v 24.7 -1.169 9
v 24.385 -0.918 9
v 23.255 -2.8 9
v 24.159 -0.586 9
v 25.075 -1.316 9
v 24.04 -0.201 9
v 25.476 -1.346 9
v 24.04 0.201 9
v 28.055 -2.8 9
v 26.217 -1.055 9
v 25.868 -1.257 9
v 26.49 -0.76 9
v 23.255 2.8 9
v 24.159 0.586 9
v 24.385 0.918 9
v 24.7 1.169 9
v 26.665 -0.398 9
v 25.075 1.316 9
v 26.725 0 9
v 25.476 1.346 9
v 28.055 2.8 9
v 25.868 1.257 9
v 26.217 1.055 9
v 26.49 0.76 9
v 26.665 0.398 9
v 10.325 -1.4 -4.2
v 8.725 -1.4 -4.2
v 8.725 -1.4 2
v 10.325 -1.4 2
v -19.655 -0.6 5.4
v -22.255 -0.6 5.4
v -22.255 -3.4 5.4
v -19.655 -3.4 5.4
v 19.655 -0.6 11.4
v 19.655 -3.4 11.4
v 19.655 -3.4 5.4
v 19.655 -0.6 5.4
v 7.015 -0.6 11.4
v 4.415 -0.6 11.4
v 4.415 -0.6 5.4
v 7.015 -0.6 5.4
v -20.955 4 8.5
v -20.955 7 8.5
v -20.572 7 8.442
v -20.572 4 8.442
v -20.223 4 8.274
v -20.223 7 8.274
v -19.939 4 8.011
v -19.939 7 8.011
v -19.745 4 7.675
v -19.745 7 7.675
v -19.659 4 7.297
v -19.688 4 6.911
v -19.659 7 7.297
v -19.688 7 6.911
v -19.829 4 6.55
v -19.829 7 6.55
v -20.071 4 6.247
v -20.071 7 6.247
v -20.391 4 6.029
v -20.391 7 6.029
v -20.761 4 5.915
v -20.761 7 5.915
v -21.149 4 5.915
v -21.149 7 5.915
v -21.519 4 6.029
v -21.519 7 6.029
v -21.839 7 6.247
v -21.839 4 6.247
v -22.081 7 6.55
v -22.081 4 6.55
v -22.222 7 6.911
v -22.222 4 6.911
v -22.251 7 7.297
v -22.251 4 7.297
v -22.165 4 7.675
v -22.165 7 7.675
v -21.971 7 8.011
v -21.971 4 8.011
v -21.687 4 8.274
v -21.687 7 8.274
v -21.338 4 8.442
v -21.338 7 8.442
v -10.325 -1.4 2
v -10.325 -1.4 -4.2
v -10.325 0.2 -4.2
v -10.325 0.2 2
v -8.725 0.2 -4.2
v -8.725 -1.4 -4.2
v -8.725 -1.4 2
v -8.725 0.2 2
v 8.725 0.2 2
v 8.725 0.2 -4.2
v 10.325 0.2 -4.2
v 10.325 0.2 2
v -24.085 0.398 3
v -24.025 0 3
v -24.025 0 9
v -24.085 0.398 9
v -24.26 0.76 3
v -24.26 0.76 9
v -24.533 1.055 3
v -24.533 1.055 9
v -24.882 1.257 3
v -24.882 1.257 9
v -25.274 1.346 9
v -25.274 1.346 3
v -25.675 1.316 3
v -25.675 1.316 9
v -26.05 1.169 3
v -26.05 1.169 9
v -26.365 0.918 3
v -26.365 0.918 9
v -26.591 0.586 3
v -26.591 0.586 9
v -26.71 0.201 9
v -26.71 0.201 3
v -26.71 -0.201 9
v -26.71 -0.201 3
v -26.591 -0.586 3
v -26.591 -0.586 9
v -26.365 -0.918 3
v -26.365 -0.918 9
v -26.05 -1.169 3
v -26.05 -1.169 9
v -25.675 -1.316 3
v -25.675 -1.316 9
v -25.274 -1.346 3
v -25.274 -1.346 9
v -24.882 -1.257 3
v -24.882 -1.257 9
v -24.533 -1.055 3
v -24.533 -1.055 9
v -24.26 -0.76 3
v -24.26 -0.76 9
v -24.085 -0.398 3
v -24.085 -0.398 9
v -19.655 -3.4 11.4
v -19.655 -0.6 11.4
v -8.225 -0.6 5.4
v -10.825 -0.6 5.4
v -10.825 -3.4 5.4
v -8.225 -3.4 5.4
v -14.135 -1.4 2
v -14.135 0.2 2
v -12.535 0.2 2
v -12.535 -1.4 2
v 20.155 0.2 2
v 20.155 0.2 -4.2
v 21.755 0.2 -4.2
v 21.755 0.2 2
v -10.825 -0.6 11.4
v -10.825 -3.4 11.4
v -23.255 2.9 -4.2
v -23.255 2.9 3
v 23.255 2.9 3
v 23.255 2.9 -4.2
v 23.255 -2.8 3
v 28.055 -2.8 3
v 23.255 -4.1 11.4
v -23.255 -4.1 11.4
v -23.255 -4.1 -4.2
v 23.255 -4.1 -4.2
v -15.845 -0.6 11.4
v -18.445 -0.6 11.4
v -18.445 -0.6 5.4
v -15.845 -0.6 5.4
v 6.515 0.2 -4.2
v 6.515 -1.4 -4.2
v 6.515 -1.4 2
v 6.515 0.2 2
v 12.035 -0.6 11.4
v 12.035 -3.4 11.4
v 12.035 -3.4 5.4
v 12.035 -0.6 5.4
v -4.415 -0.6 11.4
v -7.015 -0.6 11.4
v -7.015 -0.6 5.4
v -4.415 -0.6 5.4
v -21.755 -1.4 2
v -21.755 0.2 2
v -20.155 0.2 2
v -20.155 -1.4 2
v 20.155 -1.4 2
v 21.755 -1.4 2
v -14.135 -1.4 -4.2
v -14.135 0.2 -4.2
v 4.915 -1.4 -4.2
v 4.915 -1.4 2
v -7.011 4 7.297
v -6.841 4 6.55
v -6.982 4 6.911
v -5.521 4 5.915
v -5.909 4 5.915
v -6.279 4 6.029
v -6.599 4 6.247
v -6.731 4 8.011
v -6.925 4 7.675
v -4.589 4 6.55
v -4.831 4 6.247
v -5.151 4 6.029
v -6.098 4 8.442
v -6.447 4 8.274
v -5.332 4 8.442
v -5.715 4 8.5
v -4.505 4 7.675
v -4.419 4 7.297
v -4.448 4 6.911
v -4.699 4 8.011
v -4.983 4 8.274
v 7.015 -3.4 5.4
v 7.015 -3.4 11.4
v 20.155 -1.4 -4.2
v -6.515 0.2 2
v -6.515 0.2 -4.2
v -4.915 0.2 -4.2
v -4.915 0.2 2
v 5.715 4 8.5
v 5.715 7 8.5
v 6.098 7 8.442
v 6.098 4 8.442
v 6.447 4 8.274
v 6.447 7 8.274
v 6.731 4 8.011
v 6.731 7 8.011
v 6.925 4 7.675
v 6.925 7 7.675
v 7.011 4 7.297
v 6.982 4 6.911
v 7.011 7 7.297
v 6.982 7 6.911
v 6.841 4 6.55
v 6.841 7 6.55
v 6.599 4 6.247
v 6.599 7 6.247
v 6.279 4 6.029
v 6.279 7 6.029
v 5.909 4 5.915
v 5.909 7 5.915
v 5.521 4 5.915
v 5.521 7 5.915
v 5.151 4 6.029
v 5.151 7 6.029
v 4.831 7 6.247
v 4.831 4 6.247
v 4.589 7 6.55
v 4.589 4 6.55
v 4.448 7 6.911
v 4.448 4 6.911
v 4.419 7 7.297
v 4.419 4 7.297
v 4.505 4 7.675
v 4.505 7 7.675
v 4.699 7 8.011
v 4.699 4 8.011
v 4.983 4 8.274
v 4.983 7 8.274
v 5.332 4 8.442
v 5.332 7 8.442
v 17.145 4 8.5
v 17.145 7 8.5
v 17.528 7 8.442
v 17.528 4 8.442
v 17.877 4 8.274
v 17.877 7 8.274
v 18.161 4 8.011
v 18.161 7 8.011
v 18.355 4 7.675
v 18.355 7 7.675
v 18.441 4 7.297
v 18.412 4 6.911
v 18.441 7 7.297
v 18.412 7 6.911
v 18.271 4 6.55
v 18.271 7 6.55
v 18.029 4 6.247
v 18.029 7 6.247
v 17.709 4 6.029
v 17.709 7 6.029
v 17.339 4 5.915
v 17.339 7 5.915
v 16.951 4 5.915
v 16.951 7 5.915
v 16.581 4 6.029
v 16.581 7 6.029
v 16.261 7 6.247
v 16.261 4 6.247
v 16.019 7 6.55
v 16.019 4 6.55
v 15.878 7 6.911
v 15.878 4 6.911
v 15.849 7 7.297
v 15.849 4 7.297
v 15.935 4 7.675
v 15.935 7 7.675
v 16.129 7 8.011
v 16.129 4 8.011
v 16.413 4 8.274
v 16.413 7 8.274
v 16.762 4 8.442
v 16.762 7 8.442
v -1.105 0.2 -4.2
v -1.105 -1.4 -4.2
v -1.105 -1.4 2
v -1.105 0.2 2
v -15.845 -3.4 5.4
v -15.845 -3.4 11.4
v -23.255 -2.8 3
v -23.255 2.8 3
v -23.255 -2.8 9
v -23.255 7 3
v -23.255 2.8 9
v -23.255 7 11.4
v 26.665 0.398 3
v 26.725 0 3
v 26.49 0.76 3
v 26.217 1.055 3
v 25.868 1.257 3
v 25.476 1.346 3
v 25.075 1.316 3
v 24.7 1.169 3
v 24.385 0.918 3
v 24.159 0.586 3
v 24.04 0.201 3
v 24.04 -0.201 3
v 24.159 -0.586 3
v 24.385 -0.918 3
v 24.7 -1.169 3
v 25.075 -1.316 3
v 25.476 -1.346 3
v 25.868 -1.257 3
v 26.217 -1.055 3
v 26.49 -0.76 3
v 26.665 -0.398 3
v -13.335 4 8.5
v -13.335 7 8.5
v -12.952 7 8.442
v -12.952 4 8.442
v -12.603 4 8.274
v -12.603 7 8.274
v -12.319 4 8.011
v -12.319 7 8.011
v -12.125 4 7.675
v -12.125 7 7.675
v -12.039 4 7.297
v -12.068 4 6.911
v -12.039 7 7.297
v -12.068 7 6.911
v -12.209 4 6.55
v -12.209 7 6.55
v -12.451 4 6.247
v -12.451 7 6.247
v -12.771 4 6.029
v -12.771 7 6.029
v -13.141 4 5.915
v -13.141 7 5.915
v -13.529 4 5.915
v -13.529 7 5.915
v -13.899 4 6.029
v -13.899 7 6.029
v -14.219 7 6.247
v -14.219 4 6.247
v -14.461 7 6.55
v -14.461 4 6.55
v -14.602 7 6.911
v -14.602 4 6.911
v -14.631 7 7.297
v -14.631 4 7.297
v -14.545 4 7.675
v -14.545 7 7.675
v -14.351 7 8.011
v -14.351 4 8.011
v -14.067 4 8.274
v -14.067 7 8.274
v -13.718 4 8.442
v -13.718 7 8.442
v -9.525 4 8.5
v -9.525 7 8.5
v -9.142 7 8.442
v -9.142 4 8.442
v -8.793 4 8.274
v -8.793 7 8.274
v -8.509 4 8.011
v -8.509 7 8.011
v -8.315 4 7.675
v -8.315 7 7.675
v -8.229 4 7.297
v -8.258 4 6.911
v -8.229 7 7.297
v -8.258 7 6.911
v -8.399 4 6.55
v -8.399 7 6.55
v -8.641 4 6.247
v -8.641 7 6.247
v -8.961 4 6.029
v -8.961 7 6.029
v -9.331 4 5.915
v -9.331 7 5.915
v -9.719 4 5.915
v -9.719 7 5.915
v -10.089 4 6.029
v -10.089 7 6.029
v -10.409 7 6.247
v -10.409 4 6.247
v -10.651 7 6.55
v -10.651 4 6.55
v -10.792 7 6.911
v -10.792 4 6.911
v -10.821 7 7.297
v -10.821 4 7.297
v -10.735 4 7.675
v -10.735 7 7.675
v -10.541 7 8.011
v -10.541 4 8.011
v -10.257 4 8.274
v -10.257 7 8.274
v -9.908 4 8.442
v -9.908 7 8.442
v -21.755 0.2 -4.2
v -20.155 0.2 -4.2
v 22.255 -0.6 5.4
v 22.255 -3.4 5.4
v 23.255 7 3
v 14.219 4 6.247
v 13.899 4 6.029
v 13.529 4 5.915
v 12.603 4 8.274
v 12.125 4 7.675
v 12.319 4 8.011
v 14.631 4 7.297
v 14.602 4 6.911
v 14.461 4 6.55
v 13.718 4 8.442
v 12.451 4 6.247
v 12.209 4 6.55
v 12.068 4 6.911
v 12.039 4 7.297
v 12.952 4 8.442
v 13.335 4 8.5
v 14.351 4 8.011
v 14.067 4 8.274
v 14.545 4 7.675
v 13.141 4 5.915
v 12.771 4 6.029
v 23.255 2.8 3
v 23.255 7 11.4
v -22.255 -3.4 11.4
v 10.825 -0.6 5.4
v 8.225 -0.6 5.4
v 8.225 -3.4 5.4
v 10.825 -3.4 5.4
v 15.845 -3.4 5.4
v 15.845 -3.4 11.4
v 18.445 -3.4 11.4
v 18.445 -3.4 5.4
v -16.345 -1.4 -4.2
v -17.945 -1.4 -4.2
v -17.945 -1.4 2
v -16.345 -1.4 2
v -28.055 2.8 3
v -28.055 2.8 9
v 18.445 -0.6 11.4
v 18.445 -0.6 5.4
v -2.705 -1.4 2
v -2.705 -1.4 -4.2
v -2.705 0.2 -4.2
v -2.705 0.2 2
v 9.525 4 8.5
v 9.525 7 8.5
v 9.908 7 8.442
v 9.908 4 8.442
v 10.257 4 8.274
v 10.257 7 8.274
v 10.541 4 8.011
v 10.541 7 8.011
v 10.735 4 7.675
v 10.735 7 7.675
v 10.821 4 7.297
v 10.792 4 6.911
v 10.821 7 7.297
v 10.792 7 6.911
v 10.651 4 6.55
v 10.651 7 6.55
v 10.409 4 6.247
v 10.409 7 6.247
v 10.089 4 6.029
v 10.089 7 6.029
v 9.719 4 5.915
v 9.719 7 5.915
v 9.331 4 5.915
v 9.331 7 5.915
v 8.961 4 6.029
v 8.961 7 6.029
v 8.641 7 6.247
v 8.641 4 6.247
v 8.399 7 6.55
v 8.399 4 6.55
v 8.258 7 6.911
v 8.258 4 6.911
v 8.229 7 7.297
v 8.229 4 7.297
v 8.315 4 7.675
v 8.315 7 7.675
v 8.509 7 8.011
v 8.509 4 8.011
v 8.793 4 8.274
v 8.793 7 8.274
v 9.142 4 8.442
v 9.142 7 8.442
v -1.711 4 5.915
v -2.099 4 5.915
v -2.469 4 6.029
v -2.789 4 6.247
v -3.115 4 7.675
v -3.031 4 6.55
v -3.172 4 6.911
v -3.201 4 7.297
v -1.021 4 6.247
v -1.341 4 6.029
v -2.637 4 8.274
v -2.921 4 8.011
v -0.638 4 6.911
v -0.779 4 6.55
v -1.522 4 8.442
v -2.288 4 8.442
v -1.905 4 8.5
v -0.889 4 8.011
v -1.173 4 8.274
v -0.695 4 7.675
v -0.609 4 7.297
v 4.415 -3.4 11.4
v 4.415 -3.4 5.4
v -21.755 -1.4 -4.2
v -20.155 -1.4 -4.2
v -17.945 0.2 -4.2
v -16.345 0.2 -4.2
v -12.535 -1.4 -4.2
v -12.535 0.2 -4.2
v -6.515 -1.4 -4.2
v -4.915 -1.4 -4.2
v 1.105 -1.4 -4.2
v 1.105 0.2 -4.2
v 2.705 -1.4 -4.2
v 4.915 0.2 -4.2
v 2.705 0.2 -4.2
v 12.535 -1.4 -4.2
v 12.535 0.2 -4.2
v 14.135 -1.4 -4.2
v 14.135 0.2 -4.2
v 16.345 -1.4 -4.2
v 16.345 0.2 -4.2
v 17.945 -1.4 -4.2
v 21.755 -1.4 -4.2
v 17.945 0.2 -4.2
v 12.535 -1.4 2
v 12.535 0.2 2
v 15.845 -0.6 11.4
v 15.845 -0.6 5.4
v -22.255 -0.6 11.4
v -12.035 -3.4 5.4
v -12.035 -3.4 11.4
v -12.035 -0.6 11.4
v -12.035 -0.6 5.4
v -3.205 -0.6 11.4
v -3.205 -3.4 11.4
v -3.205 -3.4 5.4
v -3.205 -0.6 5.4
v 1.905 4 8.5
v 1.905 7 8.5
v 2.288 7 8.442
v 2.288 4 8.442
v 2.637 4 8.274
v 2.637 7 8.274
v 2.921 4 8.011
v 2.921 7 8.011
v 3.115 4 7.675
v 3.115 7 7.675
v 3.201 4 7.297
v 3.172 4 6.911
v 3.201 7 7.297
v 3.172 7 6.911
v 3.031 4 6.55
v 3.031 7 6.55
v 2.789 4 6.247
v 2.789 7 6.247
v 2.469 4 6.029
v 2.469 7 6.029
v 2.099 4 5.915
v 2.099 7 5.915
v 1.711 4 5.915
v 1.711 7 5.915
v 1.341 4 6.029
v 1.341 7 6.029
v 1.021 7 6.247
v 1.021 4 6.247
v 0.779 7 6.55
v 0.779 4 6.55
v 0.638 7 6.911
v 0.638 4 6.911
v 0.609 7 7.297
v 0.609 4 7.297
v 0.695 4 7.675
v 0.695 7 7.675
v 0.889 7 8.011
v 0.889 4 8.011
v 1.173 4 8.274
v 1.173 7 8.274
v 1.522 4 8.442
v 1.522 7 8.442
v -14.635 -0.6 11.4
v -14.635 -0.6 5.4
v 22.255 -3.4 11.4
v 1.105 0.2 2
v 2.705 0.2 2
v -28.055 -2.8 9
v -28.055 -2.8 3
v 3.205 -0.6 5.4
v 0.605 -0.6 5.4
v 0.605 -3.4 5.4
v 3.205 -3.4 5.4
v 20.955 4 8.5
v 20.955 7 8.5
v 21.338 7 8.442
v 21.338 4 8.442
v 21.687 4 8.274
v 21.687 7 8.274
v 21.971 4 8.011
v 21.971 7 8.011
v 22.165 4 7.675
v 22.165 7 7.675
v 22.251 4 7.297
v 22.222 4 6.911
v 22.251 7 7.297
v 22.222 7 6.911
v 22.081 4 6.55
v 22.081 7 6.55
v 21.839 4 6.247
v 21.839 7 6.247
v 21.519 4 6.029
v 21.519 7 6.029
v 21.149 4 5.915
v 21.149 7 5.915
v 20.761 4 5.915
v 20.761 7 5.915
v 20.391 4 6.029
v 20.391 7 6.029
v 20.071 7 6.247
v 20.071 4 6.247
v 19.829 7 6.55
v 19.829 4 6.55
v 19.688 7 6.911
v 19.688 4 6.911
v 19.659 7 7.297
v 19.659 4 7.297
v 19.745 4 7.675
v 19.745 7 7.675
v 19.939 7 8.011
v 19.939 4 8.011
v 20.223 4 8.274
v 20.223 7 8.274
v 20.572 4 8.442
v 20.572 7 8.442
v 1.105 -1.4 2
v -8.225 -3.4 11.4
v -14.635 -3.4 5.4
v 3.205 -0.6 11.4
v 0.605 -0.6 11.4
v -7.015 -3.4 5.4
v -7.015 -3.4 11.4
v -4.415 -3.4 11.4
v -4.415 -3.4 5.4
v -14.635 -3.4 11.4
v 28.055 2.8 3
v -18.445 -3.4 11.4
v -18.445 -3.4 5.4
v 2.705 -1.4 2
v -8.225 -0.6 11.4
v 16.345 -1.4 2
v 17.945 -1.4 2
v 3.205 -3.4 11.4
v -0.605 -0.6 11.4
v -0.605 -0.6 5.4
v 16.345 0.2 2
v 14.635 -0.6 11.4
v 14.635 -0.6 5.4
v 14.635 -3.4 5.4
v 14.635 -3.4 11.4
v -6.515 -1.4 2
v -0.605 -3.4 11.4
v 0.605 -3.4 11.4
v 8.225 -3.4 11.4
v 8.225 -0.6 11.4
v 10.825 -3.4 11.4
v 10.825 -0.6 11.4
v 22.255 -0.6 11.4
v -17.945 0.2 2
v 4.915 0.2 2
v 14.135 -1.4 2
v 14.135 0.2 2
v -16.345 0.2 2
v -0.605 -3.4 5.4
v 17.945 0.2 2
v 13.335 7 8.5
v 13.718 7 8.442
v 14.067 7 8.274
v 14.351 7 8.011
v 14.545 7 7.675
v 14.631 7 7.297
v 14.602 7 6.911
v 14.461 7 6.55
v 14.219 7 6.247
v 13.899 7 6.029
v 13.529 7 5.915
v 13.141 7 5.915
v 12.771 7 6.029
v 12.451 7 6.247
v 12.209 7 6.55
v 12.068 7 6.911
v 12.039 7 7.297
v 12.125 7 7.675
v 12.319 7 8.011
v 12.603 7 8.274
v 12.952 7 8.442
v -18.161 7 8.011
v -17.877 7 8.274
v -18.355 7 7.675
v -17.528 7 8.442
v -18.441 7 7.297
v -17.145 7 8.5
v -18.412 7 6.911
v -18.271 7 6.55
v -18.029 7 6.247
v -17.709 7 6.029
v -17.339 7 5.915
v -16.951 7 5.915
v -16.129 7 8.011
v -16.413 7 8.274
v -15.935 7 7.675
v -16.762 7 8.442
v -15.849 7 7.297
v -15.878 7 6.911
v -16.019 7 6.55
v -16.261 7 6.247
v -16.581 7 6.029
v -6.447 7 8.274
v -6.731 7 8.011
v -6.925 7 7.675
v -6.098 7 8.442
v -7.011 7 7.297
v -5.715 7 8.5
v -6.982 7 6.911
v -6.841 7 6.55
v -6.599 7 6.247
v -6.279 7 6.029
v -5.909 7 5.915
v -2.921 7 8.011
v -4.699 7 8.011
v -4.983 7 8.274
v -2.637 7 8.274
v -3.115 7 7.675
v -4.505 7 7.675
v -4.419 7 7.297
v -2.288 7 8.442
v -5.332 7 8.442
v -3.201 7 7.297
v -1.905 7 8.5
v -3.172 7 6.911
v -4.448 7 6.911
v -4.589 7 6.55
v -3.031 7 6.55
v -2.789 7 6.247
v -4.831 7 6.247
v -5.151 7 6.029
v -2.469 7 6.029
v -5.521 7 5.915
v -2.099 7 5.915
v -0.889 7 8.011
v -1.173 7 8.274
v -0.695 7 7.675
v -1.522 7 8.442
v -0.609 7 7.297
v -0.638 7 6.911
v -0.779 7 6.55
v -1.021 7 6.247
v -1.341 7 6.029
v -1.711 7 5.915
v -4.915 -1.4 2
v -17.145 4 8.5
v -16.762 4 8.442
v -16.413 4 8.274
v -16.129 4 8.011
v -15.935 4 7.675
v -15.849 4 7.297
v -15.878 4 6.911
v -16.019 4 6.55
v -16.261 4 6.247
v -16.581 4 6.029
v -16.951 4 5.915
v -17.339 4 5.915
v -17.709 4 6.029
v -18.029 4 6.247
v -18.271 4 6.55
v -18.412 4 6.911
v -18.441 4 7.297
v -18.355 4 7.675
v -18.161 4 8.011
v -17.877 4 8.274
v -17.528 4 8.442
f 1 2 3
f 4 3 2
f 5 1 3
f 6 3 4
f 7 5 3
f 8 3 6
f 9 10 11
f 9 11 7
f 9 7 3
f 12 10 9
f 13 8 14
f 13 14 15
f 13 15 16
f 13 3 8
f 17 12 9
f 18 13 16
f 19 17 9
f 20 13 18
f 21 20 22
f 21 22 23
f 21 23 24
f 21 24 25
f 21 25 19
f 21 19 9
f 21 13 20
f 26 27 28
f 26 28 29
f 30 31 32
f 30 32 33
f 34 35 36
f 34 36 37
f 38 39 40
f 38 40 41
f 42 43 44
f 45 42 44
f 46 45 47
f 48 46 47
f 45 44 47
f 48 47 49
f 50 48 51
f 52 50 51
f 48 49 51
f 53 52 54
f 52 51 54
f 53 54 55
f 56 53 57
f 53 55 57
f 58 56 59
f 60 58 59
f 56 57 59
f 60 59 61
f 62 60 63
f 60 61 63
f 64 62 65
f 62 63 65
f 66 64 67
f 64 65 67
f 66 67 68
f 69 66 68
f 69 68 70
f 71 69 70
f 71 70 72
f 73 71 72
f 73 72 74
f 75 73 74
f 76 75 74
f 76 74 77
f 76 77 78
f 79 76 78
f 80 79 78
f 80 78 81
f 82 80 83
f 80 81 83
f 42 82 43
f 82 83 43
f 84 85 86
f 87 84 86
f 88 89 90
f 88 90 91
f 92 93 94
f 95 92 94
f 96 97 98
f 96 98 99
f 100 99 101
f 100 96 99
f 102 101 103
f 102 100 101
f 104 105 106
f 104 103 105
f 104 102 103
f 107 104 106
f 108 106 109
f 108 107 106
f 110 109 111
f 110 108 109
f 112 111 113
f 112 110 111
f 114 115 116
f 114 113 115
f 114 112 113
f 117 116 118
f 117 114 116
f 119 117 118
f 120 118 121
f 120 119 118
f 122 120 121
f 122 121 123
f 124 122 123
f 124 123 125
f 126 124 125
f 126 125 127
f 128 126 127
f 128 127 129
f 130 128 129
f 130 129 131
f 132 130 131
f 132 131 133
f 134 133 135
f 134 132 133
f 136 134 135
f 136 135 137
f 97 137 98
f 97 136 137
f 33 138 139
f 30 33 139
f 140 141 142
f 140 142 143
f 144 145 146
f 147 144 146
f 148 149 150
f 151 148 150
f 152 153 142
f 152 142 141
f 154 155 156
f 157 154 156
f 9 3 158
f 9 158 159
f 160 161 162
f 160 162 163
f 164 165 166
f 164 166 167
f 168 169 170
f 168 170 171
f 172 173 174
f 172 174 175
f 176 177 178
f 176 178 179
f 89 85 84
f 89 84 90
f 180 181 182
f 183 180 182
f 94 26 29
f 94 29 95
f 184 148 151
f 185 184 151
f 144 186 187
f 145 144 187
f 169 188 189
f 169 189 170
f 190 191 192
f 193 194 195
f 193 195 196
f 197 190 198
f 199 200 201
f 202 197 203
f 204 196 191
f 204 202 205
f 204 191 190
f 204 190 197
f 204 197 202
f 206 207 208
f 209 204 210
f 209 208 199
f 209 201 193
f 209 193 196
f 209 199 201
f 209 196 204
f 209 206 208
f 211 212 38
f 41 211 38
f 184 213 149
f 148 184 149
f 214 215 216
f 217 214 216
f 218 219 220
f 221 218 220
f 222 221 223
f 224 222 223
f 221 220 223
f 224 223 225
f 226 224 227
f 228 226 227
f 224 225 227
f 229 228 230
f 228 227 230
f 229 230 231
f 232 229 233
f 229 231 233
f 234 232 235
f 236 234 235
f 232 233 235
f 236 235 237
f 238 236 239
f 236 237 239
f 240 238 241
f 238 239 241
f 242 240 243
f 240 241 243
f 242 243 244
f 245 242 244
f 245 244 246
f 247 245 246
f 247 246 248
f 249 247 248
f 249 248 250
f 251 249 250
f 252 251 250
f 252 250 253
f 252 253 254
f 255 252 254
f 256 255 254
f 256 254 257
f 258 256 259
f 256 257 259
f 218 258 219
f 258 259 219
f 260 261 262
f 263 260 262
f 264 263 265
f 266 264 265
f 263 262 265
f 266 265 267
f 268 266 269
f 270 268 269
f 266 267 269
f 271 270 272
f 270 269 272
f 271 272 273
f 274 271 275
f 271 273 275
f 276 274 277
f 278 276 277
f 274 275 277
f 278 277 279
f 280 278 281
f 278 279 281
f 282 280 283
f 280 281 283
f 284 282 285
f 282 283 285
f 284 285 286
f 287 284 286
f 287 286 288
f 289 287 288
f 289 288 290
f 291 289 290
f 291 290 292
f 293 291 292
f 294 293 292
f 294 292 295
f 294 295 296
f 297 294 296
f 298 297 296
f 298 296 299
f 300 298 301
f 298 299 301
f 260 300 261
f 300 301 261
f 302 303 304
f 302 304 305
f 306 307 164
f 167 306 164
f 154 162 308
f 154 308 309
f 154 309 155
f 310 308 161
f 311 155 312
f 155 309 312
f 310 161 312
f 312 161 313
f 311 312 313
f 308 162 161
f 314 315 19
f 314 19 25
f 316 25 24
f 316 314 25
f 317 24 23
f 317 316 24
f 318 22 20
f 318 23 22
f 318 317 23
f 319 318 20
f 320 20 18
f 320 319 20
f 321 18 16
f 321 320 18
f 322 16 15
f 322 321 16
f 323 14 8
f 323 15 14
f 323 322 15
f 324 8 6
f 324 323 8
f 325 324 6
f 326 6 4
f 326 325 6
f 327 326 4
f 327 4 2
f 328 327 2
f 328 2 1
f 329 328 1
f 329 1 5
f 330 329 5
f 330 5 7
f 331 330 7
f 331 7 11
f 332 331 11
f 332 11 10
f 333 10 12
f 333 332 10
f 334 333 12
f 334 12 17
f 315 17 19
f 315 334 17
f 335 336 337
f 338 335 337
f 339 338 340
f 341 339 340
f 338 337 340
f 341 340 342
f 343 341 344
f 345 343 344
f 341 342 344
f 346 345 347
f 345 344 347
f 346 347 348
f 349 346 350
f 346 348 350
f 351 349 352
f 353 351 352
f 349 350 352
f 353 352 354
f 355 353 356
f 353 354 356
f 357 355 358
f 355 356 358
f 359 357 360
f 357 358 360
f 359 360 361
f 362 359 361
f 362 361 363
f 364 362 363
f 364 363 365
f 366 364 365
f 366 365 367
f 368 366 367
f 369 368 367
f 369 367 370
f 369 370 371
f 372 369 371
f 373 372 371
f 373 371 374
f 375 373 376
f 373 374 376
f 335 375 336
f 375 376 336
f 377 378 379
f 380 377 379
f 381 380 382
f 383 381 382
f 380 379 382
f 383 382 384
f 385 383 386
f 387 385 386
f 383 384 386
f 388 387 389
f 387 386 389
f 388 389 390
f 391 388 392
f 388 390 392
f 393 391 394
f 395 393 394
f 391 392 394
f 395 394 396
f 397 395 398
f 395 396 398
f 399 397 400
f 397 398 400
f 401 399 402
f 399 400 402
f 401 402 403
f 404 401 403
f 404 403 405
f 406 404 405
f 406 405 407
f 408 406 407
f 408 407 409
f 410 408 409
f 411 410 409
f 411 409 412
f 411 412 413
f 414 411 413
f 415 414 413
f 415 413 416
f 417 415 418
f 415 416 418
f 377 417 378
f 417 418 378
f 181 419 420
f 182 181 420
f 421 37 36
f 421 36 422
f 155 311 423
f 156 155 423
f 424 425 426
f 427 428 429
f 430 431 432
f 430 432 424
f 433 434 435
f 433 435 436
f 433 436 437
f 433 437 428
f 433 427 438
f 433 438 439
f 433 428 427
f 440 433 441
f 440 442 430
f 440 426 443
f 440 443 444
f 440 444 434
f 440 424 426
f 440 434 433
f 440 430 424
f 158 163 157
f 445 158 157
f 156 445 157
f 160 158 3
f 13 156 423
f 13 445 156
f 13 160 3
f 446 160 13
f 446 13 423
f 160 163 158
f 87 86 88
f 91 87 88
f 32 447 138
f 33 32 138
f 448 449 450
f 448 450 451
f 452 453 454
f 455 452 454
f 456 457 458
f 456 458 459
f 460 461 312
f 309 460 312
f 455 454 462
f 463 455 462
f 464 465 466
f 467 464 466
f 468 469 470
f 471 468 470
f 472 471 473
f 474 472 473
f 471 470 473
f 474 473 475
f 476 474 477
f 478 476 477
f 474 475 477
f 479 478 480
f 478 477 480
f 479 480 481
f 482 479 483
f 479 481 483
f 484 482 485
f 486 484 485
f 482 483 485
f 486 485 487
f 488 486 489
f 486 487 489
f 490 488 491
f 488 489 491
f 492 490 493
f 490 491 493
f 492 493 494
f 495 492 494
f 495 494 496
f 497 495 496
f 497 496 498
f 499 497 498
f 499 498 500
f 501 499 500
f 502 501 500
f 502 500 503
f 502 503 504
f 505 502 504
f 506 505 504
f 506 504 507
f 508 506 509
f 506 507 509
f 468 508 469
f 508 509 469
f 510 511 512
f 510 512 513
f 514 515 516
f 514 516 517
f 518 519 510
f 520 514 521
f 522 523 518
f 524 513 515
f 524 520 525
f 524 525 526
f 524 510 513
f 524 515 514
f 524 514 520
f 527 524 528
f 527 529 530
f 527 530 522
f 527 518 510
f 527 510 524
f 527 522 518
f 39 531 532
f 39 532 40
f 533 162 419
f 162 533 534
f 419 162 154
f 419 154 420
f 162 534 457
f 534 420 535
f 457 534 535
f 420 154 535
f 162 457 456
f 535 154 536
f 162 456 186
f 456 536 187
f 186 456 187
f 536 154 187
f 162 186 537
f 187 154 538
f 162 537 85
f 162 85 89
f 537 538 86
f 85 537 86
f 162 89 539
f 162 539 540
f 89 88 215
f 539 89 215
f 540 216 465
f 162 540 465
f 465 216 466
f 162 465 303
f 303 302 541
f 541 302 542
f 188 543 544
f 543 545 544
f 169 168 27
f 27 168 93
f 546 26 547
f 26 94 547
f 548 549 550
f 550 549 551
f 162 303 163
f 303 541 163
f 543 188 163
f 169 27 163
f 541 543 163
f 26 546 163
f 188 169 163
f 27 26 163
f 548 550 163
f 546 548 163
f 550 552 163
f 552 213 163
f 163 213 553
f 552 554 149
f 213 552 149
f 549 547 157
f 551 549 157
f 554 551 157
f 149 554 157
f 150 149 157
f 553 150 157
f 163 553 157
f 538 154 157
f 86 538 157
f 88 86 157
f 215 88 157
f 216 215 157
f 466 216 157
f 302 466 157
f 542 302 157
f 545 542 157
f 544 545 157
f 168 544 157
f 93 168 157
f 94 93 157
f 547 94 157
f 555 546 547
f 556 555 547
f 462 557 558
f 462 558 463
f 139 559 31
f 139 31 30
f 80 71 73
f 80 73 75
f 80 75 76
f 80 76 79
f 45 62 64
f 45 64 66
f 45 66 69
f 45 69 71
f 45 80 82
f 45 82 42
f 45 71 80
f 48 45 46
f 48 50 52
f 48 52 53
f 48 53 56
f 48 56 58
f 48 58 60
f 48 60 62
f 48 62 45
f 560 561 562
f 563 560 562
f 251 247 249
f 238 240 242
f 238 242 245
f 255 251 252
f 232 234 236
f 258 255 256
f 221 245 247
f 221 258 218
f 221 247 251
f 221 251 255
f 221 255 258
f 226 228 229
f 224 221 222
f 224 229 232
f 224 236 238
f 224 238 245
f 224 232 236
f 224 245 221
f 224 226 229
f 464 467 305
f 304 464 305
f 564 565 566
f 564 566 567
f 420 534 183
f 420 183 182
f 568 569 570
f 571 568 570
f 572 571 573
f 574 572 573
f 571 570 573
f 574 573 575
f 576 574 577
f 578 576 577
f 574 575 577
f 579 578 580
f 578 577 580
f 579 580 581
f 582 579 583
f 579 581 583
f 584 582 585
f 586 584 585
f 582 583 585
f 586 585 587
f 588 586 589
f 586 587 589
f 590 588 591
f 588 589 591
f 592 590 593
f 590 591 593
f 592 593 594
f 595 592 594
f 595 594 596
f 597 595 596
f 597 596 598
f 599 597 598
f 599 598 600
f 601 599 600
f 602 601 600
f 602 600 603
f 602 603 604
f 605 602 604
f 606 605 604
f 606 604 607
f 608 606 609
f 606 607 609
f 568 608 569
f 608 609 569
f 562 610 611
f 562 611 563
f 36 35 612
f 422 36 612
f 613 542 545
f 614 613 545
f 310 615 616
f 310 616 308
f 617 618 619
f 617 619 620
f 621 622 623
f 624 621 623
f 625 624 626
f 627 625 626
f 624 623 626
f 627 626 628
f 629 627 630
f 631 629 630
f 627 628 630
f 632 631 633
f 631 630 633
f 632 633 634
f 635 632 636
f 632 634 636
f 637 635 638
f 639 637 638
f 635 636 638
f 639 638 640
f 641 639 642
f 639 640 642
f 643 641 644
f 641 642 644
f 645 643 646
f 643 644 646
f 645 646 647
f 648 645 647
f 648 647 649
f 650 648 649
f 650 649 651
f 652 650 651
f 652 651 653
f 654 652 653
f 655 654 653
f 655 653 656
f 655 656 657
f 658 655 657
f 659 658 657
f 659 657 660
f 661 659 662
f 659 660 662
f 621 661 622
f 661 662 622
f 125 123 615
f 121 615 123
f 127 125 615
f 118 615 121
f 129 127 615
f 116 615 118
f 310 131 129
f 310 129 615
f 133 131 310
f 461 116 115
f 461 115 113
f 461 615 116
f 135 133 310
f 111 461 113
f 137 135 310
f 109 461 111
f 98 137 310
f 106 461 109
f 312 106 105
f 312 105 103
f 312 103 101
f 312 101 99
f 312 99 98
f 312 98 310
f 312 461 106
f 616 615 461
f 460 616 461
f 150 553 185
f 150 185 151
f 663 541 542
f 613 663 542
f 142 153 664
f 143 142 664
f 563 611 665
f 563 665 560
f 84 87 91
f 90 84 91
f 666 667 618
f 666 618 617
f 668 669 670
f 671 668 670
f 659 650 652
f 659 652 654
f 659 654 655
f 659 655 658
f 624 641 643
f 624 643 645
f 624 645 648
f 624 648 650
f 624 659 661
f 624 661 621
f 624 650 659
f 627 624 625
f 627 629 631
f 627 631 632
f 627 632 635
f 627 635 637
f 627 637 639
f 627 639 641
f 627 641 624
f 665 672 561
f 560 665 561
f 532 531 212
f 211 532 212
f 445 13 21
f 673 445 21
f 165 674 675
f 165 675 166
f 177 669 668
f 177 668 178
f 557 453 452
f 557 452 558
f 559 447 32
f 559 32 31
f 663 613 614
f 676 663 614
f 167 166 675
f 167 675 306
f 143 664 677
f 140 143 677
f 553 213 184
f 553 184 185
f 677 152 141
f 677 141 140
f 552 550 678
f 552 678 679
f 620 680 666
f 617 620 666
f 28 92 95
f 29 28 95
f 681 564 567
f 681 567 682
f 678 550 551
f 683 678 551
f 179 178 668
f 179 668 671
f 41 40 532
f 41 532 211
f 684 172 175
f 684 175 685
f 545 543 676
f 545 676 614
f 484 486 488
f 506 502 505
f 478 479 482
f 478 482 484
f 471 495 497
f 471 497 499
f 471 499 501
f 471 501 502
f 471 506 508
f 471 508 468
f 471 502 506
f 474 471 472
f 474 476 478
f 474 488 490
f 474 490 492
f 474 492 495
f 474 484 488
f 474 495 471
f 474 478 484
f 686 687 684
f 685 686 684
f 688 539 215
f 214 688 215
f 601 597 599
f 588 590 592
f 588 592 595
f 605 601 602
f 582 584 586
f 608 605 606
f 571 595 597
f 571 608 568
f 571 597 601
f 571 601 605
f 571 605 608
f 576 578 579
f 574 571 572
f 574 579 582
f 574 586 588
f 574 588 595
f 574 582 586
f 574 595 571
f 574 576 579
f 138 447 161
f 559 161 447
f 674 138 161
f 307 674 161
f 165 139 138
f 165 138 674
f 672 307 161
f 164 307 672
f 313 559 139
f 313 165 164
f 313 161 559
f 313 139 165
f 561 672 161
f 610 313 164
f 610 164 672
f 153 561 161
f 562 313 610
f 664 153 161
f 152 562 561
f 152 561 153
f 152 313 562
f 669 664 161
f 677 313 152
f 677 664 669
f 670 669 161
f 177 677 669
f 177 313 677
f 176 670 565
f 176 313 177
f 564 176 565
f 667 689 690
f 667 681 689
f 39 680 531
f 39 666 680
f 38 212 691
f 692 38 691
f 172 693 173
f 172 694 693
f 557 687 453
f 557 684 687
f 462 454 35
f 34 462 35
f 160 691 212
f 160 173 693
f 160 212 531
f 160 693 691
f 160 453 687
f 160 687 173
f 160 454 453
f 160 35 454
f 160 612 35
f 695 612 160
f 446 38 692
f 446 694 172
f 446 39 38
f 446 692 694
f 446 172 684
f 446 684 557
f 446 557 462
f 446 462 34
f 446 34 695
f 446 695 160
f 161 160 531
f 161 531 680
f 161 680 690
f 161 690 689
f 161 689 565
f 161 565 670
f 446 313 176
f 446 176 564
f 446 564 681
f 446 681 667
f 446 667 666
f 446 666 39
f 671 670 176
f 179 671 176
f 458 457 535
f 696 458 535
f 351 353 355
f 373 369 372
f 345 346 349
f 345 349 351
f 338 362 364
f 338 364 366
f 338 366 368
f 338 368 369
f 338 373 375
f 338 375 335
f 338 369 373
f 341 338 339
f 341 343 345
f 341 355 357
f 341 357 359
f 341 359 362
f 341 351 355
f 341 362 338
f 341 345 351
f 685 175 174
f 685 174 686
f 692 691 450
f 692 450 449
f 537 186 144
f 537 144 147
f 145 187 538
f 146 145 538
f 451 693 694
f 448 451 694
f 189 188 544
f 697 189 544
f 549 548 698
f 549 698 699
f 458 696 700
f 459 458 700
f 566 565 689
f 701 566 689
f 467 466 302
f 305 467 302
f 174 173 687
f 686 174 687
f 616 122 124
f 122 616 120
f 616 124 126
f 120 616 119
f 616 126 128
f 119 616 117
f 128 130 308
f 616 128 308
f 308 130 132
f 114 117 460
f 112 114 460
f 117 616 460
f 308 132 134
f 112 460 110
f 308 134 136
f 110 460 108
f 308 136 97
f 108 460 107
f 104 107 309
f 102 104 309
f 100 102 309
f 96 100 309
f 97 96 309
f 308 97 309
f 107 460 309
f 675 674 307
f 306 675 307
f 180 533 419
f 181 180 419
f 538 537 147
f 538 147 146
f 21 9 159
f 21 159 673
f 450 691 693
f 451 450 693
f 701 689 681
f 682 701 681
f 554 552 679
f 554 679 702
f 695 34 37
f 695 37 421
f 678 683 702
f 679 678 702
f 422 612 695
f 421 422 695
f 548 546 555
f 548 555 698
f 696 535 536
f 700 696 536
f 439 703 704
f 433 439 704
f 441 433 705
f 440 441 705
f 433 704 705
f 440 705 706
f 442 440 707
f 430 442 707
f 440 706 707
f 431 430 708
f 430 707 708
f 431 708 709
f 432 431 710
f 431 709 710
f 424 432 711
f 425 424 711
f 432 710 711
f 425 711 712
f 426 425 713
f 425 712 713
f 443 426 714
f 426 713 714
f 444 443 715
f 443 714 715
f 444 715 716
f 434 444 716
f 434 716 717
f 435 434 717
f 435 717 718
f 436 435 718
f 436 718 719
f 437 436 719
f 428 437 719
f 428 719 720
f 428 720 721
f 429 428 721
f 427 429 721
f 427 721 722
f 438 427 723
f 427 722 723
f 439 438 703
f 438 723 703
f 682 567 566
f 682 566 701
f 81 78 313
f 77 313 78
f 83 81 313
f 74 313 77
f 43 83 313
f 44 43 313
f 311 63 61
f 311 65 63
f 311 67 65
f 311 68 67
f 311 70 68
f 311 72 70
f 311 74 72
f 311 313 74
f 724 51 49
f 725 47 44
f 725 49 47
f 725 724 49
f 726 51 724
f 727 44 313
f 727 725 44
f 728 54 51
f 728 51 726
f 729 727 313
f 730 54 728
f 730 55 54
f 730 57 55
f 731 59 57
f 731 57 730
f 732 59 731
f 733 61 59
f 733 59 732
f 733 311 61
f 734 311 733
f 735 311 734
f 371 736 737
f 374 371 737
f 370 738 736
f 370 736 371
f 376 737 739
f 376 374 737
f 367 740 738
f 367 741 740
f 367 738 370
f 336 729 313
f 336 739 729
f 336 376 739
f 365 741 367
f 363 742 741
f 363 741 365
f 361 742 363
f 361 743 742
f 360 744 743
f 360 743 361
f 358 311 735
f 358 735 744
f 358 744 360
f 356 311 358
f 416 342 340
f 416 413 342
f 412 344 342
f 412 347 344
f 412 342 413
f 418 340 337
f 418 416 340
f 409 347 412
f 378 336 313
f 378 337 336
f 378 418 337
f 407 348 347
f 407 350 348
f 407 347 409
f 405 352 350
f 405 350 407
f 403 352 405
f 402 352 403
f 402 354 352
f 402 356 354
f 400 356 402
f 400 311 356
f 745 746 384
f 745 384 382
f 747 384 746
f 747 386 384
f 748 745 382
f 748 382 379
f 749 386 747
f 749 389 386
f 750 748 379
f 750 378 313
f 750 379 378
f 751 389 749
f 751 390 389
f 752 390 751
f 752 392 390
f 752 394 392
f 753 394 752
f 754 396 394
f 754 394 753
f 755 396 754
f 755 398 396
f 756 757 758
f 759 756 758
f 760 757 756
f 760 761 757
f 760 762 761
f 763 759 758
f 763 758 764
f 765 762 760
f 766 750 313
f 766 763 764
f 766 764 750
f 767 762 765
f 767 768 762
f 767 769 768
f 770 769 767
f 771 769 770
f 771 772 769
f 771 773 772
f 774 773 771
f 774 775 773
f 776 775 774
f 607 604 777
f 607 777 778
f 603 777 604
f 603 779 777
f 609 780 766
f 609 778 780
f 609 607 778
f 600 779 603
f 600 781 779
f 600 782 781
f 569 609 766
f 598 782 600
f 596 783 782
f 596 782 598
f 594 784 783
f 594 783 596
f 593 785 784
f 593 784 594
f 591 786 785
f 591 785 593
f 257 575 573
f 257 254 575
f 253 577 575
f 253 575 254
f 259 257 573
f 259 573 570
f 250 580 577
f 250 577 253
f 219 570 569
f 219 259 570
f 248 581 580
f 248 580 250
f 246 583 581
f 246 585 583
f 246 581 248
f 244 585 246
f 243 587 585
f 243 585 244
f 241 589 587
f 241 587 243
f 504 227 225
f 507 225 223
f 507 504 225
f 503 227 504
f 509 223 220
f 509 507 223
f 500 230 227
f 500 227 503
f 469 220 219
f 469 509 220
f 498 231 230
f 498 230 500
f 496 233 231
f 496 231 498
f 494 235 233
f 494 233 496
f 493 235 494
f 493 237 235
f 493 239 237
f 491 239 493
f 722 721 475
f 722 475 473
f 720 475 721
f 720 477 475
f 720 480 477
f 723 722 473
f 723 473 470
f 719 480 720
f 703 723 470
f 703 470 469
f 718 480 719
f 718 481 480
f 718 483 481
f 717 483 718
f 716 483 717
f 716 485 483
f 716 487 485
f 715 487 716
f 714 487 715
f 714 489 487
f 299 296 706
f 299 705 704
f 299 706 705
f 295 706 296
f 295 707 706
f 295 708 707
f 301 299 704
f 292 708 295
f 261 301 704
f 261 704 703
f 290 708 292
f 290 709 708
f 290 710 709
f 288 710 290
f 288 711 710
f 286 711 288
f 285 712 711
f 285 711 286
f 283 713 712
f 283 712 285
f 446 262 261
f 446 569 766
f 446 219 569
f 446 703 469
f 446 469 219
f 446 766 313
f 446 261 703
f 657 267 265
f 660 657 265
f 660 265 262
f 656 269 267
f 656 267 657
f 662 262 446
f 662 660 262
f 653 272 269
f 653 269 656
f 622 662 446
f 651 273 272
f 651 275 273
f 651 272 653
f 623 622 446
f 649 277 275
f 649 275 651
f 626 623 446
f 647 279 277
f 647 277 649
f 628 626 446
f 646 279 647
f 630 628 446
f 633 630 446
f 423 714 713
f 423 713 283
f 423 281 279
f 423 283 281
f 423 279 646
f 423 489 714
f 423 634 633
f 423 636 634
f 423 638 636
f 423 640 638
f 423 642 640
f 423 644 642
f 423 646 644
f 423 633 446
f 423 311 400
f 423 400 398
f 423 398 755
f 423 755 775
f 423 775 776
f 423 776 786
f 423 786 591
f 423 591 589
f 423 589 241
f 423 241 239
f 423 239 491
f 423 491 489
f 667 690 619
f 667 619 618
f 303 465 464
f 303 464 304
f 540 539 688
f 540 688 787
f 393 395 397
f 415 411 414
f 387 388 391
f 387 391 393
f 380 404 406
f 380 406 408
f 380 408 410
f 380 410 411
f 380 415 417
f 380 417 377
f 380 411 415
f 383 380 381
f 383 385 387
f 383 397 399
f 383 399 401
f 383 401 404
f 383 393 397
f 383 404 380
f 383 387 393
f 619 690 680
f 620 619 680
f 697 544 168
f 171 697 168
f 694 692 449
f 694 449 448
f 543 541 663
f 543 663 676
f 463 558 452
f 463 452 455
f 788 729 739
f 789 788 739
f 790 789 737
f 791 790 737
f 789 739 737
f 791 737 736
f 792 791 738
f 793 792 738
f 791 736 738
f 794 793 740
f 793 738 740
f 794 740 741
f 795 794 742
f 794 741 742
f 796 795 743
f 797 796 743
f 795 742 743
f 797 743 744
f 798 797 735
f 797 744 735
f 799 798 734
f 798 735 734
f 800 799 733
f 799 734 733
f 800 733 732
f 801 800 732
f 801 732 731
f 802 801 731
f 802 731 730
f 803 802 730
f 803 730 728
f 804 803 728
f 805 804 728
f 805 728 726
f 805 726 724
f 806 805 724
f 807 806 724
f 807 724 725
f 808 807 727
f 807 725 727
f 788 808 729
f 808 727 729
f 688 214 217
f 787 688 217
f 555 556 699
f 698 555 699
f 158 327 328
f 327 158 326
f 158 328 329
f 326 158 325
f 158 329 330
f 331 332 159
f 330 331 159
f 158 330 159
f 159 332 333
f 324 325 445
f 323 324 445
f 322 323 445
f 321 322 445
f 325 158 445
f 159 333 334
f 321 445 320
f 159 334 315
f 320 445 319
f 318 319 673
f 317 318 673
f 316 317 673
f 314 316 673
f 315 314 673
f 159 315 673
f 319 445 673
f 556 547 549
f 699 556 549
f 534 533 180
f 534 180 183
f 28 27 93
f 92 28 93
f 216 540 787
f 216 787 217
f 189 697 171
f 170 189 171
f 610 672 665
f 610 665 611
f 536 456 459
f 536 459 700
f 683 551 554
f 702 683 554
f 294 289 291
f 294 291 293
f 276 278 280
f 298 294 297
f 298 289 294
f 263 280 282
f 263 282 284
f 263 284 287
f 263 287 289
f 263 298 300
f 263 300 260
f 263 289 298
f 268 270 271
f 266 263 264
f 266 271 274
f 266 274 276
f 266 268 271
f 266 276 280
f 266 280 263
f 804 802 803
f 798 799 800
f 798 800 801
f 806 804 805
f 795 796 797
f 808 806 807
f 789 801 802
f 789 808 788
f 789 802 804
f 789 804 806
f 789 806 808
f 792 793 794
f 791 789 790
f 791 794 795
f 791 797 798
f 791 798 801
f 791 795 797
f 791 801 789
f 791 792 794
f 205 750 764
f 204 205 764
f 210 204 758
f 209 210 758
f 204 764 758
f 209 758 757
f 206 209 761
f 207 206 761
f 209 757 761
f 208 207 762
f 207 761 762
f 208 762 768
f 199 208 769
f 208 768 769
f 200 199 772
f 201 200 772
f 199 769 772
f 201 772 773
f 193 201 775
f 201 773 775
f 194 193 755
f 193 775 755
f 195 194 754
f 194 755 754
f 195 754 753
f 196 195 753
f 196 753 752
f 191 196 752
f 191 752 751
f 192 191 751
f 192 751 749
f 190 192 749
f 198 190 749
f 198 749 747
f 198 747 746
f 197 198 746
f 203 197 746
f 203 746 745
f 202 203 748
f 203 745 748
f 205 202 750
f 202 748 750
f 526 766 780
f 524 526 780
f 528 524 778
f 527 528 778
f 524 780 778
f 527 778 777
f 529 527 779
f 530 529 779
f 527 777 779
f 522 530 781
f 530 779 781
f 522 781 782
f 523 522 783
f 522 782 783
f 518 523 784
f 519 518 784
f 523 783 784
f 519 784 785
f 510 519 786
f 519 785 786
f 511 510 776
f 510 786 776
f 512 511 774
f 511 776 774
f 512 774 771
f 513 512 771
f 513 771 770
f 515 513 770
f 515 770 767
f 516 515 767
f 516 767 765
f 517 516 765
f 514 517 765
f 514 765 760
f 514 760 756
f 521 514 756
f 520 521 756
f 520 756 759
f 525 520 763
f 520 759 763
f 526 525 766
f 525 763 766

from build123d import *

# Parameters (mm, degrees)
SK_BODY_W                     = 46.51
SK_BODY_H                     = 11.1
BODY_DEPTH                    = 8.4
SK_FLANGE_EARS_W              = 4.8
SK_FLANGE_EARS_H              = 5.6
FLANGE_EARS_DEPTH             = 6
SK_NOSE_W                     = 46.51
SK_NOSE_H                     = 7
NOSE_DEPTH                    = 7.2
FLANGE_SCREW_HOLES_DEPTH      = 32.081232681
FLANGE_SCREW_HOLES_DEPTH_BACK = 32.081232681
SK_FLANGE_SCREW_HOLES_R       = 1.35
SK_WIRE_ENTRIES_W             = 2.6
SK_WIRE_ENTRIES_H             = 2.8
WIRE_ENTRIES_DEPTH            = 6
SK_CONTACT_OPENINGS_W         = 1.6
SK_CONTACT_OPENINGS_H         = 1.6
CONTACT_OPENINGS_DEPTH        = 6.2
SK_CLAMP_SCREW_HOLES_R        = 1.3
CLAMP_SCREW_HOLES_DEPTH       = 3


with BuildPart() as part:
    # SK Body → Body (new body)
    with BuildSketch(Plane.XY.offset(3)):
        with Locations((0, 1.45)):
            Rectangle(SK_BODY_W, SK_BODY_H)
    extrude(amount=BODY_DEPTH)

    # SK Flange ears → Flange ears (add)
    with BuildSketch(Plane.XY.offset(3)):
        with Locations((25.655, 0)):
            Rectangle(SK_FLANGE_EARS_W, SK_FLANGE_EARS_H)
        with Locations((-25.655, 0)):
            Rectangle(SK_FLANGE_EARS_W, SK_FLANGE_EARS_H)
    extrude(amount=FLANGE_EARS_DEPTH)

    # SK Nose → Nose (add)
    with BuildSketch(Plane.XY.offset(3)):
        with Locations((0, -0.6)):
            Rectangle(SK_NOSE_W, SK_NOSE_H)
    extrude(amount=-NOSE_DEPTH)

    # SK Flange screw holes → Flange screw holes (cut, two sides: drawn at the far end of the back side and taken through both)
    with BuildSketch(Plane.XY.offset(-FLANGE_SCREW_HOLES_DEPTH_BACK)):
        with Locations((-25.375, 0)):
            Circle(SK_FLANGE_SCREW_HOLES_R)
        with Locations((25.375, 0)):
            Circle(SK_FLANGE_SCREW_HOLES_R)
    extrude(amount=FLANGE_SCREW_HOLES_DEPTH + FLANGE_SCREW_HOLES_DEPTH_BACK, mode=Mode.SUBTRACT)

    # SK Wire entries → Wire entries (cut)
    with BuildSketch(Plane.XY.offset(11.4)):
        with Locations((-20.955, -2)):
            Rectangle(SK_WIRE_ENTRIES_W, SK_WIRE_ENTRIES_H)
        with Locations((-17.145, -2)):
            Rectangle(SK_WIRE_ENTRIES_W, SK_WIRE_ENTRIES_H)
        with Locations((-13.335, -2)):
            Rectangle(SK_WIRE_ENTRIES_W, SK_WIRE_ENTRIES_H)
        with Locations((-9.525, -2)):
            Rectangle(SK_WIRE_ENTRIES_W, SK_WIRE_ENTRIES_H)
        with Locations((-5.715, -2)):
            Rectangle(SK_WIRE_ENTRIES_W, SK_WIRE_ENTRIES_H)
        with Locations((-1.905, -2)):
            Rectangle(SK_WIRE_ENTRIES_W, SK_WIRE_ENTRIES_H)
        with Locations((1.905, -2)):
            Rectangle(SK_WIRE_ENTRIES_W, SK_WIRE_ENTRIES_H)
        with Locations((5.715, -2)):
            Rectangle(SK_WIRE_ENTRIES_W, SK_WIRE_ENTRIES_H)
        with Locations((9.525, -2)):
            Rectangle(SK_WIRE_ENTRIES_W, SK_WIRE_ENTRIES_H)
        with Locations((13.335, -2)):
            Rectangle(SK_WIRE_ENTRIES_W, SK_WIRE_ENTRIES_H)
        with Locations((17.145, -2)):
            Rectangle(SK_WIRE_ENTRIES_W, SK_WIRE_ENTRIES_H)
        with Locations((20.955, -2)):
            Rectangle(SK_WIRE_ENTRIES_W, SK_WIRE_ENTRIES_H)
    extrude(amount=-WIRE_ENTRIES_DEPTH, mode=Mode.SUBTRACT)

    # SK Contact openings → Contact openings (cut)
    with BuildSketch(Plane.XY.offset(-4.2)):
        with Locations((-20.955, -0.6)):
            Rectangle(SK_CONTACT_OPENINGS_W, SK_CONTACT_OPENINGS_H)
        with Locations((-17.145, -0.6)):
            Rectangle(SK_CONTACT_OPENINGS_W, SK_CONTACT_OPENINGS_H)
        with Locations((-13.335, -0.6)):
            Rectangle(SK_CONTACT_OPENINGS_W, SK_CONTACT_OPENINGS_H)
        with Locations((-9.525, -0.6)):
            Rectangle(SK_CONTACT_OPENINGS_W, SK_CONTACT_OPENINGS_H)
        with Locations((-5.715, -0.6)):
            Rectangle(SK_CONTACT_OPENINGS_W, SK_CONTACT_OPENINGS_H)
        with Locations((-1.905, -0.6)):
            Rectangle(SK_CONTACT_OPENINGS_W, SK_CONTACT_OPENINGS_H)
        with Locations((1.905, -0.6)):
            Rectangle(SK_CONTACT_OPENINGS_W, SK_CONTACT_OPENINGS_H)
        with Locations((5.715, -0.6)):
            Rectangle(SK_CONTACT_OPENINGS_W, SK_CONTACT_OPENINGS_H)
        with Locations((9.525, -0.6)):
            Rectangle(SK_CONTACT_OPENINGS_W, SK_CONTACT_OPENINGS_H)
        with Locations((13.335, -0.6)):
            Rectangle(SK_CONTACT_OPENINGS_W, SK_CONTACT_OPENINGS_H)
        with Locations((17.145, -0.6)):
            Rectangle(SK_CONTACT_OPENINGS_W, SK_CONTACT_OPENINGS_H)
        with Locations((20.955, -0.6)):
            Rectangle(SK_CONTACT_OPENINGS_W, SK_CONTACT_OPENINGS_H)
    extrude(amount=CONTACT_OPENINGS_DEPTH, mode=Mode.SUBTRACT)

    # SK Clamp screw holes → Clamp screw holes (cut)
    with BuildSketch(Plane(origin=(0, 7, 0), x_dir=(1, 0, 0), z_dir=(0, 1, 0))):
        with Locations(Location((-20.955, -7.2, 0), (0, 0, 270))):
            Circle(SK_CLAMP_SCREW_HOLES_R)
        with Locations(Location((-17.145, -7.2, 0), (0, 0, 270))):
            Circle(SK_CLAMP_SCREW_HOLES_R)
        with Locations(Location((-13.335, -7.2, 0), (0, 0, 270))):
            Circle(SK_CLAMP_SCREW_HOLES_R)
        with Locations(Location((-9.525, -7.2, 0), (0, 0, 270))):
            Circle(SK_CLAMP_SCREW_HOLES_R)
        with Locations(Location((-5.715, -7.2, 0), (0, 0, 270))):
            Circle(SK_CLAMP_SCREW_HOLES_R)
        with Locations(Location((-1.905, -7.2, 0), (0, 0, 270))):
            Circle(SK_CLAMP_SCREW_HOLES_R)
        with Locations(Location((1.905, -7.2, 0), (0, 0, 270))):
            Circle(SK_CLAMP_SCREW_HOLES_R)
        with Locations(Location((5.715, -7.2, 0), (0, 0, 270))):
            Circle(SK_CLAMP_SCREW_HOLES_R)
        with Locations(Location((9.525, -7.2, 0), (0, 0, 270))):
            Circle(SK_CLAMP_SCREW_HOLES_R)
        with Locations(Location((13.335, -7.2, 0), (0, 0, 270))):
            Circle(SK_CLAMP_SCREW_HOLES_R)
        with Locations(Location((17.145, -7.2, 0), (0, 0, 270))):
            Circle(SK_CLAMP_SCREW_HOLES_R)
        with Locations(Location((20.955, -7.2, 0), (0, 0, 270))):
            Circle(SK_CLAMP_SCREW_HOLES_R)
    extrude(amount=-CLAMP_SCREW_HOLES_DEPTH, mode=Mode.SUBTRACT)


solid = part.part
